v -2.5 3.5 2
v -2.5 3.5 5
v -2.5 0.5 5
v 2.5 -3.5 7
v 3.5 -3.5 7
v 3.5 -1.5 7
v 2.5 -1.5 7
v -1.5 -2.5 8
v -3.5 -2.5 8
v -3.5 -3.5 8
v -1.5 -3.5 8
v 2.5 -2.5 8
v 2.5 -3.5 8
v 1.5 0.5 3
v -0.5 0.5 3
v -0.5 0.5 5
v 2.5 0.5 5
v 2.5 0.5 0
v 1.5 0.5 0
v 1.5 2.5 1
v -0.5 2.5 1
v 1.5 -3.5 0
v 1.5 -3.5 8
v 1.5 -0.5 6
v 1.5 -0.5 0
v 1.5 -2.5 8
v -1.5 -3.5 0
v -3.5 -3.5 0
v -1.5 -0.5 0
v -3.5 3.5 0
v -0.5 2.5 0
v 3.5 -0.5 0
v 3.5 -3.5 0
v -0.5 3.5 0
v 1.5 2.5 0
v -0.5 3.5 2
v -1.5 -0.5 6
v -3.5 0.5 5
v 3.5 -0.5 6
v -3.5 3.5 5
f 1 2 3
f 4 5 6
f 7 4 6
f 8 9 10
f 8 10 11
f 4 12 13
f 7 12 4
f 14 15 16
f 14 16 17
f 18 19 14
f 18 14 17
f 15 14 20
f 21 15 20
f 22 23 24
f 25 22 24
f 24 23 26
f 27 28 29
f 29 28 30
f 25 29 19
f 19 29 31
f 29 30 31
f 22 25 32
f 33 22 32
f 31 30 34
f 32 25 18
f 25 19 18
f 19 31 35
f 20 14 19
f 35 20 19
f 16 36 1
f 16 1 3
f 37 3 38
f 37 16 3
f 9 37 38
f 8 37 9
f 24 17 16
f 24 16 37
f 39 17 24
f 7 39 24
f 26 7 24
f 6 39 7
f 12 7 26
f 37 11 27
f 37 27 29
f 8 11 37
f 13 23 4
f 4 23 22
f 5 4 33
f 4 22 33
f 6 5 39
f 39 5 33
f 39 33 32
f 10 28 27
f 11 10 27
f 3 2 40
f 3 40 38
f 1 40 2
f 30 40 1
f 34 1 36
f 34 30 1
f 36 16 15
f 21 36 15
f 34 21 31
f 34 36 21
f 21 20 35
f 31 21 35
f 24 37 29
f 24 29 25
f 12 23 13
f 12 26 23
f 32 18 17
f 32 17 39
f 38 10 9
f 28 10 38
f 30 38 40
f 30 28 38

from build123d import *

# Parameters (mm, degrees)
SKETCH1_W           = 7
SKETCH1_H           = 7
BOSS_EXTRUDE1_DEPTH = 8
SKETCH2_W           = 3
SKETCH2_H           = 3
CUT_EXTRUDE1_DEPTH  = 9
CUT_EXTRUDE2_DEPTH  = 6
CUT_EXTRUDE3_DEPTH  = 6
SKETCH5_W           = 1
SKETCH5_H           = 2
CUT_EXTRUDE4_DEPTH  = 1
CUT_EXTRUDE5_DEPTH  = 4
SKETCH7_W           = 2
SKETCH7_H           = 3
CUT_EXTRUDE6_DEPTH  = 2
CUT_EXTRUDE7_DEPTH  = 6


with BuildPart() as part:
    # Sketch1 → Boss-Extrude1 (new body)
    with BuildSketch(Plane.XY):
        Rectangle(SKETCH1_W, SKETCH1_H)
    extrude(amount=BOSS_EXTRUDE1_DEPTH)

    # Sketch2 → Cut-Extrude1 (cut, through all)
    with BuildSketch(Plane.XY.offset(8)):
        with Locations((0, -2)):
            Rectangle(SKETCH2_W, SKETCH2_H)
    extrude(amount=-CUT_EXTRUDE1_DEPTH, mode=Mode.SUBTRACT)

    # Sketch3 → Cut-Extrude2 (cut)
    with BuildSketch(Plane(origin=(3.5, 0, 0), x_dir=(0, 0, -1), z_dir=(1, 0, 0))):
        Polygon((-8, -2.5), (-2, 3.5), (-8, 3.5), align=None)
    extrude(amount=-CUT_EXTRUDE2_DEPTH, mode=Mode.SUBTRACT)

    # Sketch4 → Cut-Extrude3 (cut)
    with BuildSketch(Plane(origin=(-2.5, 0, 0), x_dir=(0, 0, -1), z_dir=(1, 0, 0))):
        Polygon((-5, 3.5), (-5, 0.5), (-8, -2.5), (-8, 3.5), align=None)
    extrude(amount=-CUT_EXTRUDE3_DEPTH, mode=Mode.SUBTRACT)

    # Sketch5 → Cut-Extrude4 (cut)
    with BuildSketch(Plane(origin=(3.5, 0, 0), x_dir=(0, 0, -1), z_dir=(1, 0, 0))):
        with Locations((-7.5, -2.5)):
            Rectangle(SKETCH5_W, SKETCH5_H)
    extrude(amount=-CUT_EXTRUDE4_DEPTH, mode=Mode.SUBTRACT)

    # Sketch6 → Cut-Extrude5 (cut)
    with BuildSketch(Plane(origin=(3.5, 0, 0), x_dir=(0, 0, -1), z_dir=(1, 0, 0))):
        Polygon((0, 3.5), (-2, 3.5), (-5, 0.5), (-3, 0.5), (-1, 2.5), (0, 2.5), align=None)
    extrude(amount=-CUT_EXTRUDE5_DEPTH, mode=Mode.SUBTRACT)

    # Sketch7 → Cut-Extrude6 (cut)
    with BuildSketch(Plane(origin=(0, 2.5, 0), x_dir=(1, 0, 0), z_dir=(0, 1, 0))):
        with Locations((2.5, -1.5)):
            Rectangle(SKETCH7_W, SKETCH7_H)
    extrude(amount=-CUT_EXTRUDE6_DEPTH, mode=Mode.SUBTRACT)

    # Sketch8 → Cut-Extrude7 (cut)
    with BuildSketch(Plane(origin=(0, 0, 0), x_dir=(-1, 0, 0), z_dir=(0, 0, -1))):
        Polygon((-2.5, 0.5), (-3.5, -0.5), (-3.5, 0.5), align=None)
    extrude(amount=-CUT_EXTRUDE7_DEPTH, mode=Mode.SUBTRACT)


solid = part.part
